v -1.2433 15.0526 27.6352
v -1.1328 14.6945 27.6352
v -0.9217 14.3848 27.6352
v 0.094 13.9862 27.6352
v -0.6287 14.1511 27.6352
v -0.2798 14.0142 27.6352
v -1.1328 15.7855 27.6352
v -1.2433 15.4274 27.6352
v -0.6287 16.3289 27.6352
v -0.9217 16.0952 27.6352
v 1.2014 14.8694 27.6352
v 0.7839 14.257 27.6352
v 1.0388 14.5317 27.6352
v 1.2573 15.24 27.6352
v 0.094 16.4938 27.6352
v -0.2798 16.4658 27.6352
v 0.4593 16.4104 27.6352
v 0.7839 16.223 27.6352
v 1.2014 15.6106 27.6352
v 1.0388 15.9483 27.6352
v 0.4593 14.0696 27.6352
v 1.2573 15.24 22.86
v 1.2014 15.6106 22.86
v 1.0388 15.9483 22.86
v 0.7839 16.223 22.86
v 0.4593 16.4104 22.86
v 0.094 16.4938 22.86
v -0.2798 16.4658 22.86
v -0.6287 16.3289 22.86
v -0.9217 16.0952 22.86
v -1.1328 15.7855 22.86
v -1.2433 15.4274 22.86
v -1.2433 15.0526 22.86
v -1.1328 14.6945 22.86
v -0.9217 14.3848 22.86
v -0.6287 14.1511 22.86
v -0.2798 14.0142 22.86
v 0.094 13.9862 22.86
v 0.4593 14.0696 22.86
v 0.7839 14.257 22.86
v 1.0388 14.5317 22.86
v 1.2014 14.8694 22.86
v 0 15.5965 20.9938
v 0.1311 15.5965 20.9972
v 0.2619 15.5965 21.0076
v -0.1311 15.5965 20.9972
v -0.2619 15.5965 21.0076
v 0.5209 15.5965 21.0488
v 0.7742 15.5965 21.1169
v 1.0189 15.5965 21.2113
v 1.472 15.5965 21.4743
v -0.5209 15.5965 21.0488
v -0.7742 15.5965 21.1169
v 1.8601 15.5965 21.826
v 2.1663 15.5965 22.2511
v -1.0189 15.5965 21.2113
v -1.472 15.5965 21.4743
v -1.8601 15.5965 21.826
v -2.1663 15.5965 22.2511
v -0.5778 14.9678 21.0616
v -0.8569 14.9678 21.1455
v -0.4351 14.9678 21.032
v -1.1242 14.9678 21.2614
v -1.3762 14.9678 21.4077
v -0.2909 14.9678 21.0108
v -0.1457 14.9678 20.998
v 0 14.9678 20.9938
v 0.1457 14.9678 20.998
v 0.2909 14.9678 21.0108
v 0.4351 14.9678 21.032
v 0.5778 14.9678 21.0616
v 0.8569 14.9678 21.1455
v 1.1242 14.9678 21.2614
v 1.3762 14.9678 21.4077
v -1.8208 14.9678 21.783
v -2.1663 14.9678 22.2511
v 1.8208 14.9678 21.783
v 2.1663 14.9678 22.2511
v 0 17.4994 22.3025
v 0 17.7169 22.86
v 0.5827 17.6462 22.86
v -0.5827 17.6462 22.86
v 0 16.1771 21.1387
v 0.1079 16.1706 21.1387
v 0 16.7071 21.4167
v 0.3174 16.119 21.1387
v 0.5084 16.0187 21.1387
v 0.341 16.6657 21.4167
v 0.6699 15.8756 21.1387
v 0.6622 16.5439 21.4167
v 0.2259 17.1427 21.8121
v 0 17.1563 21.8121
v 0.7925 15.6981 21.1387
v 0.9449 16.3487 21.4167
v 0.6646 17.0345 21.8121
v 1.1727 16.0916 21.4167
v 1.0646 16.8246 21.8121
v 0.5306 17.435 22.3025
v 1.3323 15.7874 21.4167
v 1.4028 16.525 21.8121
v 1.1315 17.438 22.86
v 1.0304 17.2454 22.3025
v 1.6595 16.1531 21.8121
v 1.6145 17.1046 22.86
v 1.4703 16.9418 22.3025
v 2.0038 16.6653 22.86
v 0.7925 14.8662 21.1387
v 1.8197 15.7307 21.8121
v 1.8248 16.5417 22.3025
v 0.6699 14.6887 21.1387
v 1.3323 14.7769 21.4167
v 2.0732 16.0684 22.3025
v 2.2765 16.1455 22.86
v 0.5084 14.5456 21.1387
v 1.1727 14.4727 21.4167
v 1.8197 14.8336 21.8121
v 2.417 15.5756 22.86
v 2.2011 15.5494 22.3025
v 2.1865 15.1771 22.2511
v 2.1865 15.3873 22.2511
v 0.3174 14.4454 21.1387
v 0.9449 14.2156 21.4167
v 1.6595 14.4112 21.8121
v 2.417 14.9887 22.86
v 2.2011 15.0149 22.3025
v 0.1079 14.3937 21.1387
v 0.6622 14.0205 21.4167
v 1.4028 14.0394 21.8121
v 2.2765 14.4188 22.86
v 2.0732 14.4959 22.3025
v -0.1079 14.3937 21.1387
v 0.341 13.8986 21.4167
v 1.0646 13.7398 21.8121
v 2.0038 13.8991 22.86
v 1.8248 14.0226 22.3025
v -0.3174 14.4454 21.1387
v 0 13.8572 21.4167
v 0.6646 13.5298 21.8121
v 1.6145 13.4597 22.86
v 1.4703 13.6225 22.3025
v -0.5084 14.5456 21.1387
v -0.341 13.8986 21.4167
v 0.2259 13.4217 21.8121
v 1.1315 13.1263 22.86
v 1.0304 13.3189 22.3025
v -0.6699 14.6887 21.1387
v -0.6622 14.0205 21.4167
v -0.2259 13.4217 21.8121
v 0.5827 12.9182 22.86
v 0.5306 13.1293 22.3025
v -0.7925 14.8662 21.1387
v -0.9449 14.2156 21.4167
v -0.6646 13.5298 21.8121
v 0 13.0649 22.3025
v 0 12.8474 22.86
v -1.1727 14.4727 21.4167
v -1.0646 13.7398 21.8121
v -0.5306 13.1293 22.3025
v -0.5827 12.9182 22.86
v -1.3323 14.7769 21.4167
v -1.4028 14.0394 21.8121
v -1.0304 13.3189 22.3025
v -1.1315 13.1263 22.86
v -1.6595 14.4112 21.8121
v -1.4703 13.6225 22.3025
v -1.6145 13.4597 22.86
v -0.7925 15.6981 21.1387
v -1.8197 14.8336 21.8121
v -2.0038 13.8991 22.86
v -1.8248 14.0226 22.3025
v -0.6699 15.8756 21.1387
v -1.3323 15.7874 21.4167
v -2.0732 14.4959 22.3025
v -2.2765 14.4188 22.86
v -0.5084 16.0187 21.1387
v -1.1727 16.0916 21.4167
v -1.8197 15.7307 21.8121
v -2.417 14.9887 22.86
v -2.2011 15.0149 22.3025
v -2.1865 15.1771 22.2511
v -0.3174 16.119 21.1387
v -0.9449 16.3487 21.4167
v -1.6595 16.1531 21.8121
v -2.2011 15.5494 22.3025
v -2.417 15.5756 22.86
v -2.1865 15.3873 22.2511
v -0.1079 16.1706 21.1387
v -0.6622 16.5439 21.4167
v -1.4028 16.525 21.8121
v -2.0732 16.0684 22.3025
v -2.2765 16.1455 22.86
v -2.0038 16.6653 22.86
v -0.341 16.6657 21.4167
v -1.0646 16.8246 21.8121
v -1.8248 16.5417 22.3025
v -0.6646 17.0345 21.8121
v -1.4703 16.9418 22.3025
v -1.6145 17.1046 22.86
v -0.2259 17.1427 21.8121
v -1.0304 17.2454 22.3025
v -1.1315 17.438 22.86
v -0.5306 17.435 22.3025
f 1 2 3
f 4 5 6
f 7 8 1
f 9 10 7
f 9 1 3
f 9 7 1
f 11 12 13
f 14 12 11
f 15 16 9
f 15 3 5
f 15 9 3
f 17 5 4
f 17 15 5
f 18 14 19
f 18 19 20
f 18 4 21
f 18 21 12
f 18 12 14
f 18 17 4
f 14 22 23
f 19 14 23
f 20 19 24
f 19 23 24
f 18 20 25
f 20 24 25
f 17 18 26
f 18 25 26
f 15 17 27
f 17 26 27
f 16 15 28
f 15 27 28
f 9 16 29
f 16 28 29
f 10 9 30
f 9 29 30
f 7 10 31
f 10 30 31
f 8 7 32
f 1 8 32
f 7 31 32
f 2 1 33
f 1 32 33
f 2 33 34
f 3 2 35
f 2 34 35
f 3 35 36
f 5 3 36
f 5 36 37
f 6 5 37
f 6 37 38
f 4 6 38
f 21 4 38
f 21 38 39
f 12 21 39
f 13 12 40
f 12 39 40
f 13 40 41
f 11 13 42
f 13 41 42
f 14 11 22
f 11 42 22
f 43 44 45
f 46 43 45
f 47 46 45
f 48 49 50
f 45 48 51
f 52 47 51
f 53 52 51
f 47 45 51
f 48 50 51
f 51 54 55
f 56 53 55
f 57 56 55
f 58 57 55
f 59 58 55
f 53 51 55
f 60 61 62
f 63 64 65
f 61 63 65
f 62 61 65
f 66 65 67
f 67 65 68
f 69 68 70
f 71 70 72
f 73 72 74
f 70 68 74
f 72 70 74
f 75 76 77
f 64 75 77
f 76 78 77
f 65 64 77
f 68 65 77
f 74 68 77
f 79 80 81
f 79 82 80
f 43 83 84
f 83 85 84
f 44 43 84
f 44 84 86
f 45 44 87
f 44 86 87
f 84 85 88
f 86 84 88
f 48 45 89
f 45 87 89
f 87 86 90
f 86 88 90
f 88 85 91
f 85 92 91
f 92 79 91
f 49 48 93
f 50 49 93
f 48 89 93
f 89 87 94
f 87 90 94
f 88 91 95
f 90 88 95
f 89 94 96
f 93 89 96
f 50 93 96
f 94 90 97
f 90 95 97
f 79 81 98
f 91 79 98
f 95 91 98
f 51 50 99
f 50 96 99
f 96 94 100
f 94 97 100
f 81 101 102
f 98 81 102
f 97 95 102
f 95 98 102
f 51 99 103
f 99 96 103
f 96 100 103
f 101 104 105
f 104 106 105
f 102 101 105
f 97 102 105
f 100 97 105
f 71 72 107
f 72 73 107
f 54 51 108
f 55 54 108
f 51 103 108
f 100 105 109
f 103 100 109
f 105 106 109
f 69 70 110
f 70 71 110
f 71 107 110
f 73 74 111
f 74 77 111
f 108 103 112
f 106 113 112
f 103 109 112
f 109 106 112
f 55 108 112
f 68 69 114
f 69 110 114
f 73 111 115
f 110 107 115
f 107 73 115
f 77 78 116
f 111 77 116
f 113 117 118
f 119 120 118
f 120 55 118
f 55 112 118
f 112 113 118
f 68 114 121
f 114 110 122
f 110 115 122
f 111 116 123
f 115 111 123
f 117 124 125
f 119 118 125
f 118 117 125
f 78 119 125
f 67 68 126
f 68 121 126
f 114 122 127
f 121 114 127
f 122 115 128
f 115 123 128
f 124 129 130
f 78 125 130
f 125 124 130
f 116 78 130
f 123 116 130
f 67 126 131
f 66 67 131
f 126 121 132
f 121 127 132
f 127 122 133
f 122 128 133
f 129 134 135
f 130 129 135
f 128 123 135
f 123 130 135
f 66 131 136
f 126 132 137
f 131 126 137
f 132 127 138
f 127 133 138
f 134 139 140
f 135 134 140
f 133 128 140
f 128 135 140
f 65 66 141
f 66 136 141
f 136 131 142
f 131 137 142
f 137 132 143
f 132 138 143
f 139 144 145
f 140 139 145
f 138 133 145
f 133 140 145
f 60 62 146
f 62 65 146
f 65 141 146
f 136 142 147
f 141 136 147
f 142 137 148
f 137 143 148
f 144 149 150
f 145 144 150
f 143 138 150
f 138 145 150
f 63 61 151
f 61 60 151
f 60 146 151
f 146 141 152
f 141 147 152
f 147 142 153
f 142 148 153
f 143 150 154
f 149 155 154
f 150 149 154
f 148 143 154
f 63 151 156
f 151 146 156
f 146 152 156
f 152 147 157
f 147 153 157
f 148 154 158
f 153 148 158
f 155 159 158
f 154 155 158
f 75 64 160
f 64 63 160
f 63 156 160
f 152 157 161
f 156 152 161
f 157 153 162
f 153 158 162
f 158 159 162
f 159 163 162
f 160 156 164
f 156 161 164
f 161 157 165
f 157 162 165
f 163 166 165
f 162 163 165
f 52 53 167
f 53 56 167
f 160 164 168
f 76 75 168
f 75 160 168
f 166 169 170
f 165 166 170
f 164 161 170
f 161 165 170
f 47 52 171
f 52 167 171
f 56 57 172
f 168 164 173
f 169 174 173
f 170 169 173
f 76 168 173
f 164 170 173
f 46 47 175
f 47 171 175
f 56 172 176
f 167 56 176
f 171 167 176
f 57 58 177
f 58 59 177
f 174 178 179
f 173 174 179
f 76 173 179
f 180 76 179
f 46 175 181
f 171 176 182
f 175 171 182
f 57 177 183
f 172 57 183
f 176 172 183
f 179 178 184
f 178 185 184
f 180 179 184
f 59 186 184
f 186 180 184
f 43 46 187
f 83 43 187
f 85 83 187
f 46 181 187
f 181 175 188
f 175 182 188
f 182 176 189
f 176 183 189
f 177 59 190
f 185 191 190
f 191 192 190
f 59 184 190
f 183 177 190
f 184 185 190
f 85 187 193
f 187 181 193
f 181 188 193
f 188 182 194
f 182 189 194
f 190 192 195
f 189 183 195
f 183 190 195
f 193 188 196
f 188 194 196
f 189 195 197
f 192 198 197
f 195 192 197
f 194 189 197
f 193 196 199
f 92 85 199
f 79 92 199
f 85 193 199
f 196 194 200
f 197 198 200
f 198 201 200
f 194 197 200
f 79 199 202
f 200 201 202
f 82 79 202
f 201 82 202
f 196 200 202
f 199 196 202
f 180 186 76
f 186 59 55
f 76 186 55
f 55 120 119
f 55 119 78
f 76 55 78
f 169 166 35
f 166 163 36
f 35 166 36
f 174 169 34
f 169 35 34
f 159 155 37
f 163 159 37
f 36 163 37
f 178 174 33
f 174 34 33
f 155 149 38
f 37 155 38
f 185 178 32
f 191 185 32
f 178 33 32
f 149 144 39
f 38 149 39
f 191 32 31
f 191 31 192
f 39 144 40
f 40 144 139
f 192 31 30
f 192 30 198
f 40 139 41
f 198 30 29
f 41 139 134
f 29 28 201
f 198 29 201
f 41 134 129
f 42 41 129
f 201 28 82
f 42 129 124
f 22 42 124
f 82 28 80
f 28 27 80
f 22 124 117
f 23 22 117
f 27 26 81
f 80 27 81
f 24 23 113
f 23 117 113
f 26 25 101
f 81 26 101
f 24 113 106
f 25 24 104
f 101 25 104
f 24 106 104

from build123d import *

# Parameters (mm, degrees)
SKETCH2_R           = 1.2573
BOSS_EXTRUDE1_DEPTH = 4.7752
CUT_EXTRUDE1_DEPTH  = 3.434750981


with BuildPart() as part:
    # Sketch1 → Base-Revolve (revolve)
    with BuildSketch(Plane(origin=(0, 0, 0), x_dir=(0, 0, -1), z_dir=(1, 0, 0))):
        with BuildLine():
            Line((-22.86, 15.282157927), (-20.97405, 15.282157927))
            ThreePointArc((-20.97405, 15.282157927), (-21.500684149, 16.822029654), (-22.86, 17.716908908))
            Line((-22.86, 17.716908908), (-22.86, 15.282157927))
        make_face()
    revolve(axis=Axis((0, 15.282157927, 28.59405), (0, 0, -1)))

    # Sketch2 → Boss-Extrude1 (add)
    with BuildSketch(Plane.XY.offset(22.86)):
        with Locations((0, 15.24)):
            Circle(SKETCH2_R)
    extrude(amount=BOSS_EXTRUDE1_DEPTH)

    # Sketch4 → Cut-Extrude1 (cut, through all)
    with BuildSketch(Plane(origin=(0, 0, 0), x_dir=(0, 0, -1), z_dir=(1, 0, 0))):
        with BuildLine():
            Line((-22.251072657, 14.967832927), (-20.993772657, 14.967832927))
            ThreePointArc((-20.993772657, 14.967832927), (-20.97405, 15.282157927), (-20.993772657, 15.596482927))
            Line((-20.993772657, 15.596482927), (-22.251072657, 15.596482927))
            Line((-22.251072657, 15.596482927), (-22.251072657, 14.967832927))
        make_face()
    cut_extrude1 = extrude(amount=-CUT_EXTRUDE1_DEPTH, mode=Mode.SUBTRACT)

    # Mirror1: Cut-Extrude1 across plane
    add(cut_extrude1.mirror(Plane(origin=(0, 15.282157927, 23.48865), x_dir=(0, 0, 1), z_dir=(1, 0, 0))), mode=Mode.SUBTRACT)


solid = part.part
